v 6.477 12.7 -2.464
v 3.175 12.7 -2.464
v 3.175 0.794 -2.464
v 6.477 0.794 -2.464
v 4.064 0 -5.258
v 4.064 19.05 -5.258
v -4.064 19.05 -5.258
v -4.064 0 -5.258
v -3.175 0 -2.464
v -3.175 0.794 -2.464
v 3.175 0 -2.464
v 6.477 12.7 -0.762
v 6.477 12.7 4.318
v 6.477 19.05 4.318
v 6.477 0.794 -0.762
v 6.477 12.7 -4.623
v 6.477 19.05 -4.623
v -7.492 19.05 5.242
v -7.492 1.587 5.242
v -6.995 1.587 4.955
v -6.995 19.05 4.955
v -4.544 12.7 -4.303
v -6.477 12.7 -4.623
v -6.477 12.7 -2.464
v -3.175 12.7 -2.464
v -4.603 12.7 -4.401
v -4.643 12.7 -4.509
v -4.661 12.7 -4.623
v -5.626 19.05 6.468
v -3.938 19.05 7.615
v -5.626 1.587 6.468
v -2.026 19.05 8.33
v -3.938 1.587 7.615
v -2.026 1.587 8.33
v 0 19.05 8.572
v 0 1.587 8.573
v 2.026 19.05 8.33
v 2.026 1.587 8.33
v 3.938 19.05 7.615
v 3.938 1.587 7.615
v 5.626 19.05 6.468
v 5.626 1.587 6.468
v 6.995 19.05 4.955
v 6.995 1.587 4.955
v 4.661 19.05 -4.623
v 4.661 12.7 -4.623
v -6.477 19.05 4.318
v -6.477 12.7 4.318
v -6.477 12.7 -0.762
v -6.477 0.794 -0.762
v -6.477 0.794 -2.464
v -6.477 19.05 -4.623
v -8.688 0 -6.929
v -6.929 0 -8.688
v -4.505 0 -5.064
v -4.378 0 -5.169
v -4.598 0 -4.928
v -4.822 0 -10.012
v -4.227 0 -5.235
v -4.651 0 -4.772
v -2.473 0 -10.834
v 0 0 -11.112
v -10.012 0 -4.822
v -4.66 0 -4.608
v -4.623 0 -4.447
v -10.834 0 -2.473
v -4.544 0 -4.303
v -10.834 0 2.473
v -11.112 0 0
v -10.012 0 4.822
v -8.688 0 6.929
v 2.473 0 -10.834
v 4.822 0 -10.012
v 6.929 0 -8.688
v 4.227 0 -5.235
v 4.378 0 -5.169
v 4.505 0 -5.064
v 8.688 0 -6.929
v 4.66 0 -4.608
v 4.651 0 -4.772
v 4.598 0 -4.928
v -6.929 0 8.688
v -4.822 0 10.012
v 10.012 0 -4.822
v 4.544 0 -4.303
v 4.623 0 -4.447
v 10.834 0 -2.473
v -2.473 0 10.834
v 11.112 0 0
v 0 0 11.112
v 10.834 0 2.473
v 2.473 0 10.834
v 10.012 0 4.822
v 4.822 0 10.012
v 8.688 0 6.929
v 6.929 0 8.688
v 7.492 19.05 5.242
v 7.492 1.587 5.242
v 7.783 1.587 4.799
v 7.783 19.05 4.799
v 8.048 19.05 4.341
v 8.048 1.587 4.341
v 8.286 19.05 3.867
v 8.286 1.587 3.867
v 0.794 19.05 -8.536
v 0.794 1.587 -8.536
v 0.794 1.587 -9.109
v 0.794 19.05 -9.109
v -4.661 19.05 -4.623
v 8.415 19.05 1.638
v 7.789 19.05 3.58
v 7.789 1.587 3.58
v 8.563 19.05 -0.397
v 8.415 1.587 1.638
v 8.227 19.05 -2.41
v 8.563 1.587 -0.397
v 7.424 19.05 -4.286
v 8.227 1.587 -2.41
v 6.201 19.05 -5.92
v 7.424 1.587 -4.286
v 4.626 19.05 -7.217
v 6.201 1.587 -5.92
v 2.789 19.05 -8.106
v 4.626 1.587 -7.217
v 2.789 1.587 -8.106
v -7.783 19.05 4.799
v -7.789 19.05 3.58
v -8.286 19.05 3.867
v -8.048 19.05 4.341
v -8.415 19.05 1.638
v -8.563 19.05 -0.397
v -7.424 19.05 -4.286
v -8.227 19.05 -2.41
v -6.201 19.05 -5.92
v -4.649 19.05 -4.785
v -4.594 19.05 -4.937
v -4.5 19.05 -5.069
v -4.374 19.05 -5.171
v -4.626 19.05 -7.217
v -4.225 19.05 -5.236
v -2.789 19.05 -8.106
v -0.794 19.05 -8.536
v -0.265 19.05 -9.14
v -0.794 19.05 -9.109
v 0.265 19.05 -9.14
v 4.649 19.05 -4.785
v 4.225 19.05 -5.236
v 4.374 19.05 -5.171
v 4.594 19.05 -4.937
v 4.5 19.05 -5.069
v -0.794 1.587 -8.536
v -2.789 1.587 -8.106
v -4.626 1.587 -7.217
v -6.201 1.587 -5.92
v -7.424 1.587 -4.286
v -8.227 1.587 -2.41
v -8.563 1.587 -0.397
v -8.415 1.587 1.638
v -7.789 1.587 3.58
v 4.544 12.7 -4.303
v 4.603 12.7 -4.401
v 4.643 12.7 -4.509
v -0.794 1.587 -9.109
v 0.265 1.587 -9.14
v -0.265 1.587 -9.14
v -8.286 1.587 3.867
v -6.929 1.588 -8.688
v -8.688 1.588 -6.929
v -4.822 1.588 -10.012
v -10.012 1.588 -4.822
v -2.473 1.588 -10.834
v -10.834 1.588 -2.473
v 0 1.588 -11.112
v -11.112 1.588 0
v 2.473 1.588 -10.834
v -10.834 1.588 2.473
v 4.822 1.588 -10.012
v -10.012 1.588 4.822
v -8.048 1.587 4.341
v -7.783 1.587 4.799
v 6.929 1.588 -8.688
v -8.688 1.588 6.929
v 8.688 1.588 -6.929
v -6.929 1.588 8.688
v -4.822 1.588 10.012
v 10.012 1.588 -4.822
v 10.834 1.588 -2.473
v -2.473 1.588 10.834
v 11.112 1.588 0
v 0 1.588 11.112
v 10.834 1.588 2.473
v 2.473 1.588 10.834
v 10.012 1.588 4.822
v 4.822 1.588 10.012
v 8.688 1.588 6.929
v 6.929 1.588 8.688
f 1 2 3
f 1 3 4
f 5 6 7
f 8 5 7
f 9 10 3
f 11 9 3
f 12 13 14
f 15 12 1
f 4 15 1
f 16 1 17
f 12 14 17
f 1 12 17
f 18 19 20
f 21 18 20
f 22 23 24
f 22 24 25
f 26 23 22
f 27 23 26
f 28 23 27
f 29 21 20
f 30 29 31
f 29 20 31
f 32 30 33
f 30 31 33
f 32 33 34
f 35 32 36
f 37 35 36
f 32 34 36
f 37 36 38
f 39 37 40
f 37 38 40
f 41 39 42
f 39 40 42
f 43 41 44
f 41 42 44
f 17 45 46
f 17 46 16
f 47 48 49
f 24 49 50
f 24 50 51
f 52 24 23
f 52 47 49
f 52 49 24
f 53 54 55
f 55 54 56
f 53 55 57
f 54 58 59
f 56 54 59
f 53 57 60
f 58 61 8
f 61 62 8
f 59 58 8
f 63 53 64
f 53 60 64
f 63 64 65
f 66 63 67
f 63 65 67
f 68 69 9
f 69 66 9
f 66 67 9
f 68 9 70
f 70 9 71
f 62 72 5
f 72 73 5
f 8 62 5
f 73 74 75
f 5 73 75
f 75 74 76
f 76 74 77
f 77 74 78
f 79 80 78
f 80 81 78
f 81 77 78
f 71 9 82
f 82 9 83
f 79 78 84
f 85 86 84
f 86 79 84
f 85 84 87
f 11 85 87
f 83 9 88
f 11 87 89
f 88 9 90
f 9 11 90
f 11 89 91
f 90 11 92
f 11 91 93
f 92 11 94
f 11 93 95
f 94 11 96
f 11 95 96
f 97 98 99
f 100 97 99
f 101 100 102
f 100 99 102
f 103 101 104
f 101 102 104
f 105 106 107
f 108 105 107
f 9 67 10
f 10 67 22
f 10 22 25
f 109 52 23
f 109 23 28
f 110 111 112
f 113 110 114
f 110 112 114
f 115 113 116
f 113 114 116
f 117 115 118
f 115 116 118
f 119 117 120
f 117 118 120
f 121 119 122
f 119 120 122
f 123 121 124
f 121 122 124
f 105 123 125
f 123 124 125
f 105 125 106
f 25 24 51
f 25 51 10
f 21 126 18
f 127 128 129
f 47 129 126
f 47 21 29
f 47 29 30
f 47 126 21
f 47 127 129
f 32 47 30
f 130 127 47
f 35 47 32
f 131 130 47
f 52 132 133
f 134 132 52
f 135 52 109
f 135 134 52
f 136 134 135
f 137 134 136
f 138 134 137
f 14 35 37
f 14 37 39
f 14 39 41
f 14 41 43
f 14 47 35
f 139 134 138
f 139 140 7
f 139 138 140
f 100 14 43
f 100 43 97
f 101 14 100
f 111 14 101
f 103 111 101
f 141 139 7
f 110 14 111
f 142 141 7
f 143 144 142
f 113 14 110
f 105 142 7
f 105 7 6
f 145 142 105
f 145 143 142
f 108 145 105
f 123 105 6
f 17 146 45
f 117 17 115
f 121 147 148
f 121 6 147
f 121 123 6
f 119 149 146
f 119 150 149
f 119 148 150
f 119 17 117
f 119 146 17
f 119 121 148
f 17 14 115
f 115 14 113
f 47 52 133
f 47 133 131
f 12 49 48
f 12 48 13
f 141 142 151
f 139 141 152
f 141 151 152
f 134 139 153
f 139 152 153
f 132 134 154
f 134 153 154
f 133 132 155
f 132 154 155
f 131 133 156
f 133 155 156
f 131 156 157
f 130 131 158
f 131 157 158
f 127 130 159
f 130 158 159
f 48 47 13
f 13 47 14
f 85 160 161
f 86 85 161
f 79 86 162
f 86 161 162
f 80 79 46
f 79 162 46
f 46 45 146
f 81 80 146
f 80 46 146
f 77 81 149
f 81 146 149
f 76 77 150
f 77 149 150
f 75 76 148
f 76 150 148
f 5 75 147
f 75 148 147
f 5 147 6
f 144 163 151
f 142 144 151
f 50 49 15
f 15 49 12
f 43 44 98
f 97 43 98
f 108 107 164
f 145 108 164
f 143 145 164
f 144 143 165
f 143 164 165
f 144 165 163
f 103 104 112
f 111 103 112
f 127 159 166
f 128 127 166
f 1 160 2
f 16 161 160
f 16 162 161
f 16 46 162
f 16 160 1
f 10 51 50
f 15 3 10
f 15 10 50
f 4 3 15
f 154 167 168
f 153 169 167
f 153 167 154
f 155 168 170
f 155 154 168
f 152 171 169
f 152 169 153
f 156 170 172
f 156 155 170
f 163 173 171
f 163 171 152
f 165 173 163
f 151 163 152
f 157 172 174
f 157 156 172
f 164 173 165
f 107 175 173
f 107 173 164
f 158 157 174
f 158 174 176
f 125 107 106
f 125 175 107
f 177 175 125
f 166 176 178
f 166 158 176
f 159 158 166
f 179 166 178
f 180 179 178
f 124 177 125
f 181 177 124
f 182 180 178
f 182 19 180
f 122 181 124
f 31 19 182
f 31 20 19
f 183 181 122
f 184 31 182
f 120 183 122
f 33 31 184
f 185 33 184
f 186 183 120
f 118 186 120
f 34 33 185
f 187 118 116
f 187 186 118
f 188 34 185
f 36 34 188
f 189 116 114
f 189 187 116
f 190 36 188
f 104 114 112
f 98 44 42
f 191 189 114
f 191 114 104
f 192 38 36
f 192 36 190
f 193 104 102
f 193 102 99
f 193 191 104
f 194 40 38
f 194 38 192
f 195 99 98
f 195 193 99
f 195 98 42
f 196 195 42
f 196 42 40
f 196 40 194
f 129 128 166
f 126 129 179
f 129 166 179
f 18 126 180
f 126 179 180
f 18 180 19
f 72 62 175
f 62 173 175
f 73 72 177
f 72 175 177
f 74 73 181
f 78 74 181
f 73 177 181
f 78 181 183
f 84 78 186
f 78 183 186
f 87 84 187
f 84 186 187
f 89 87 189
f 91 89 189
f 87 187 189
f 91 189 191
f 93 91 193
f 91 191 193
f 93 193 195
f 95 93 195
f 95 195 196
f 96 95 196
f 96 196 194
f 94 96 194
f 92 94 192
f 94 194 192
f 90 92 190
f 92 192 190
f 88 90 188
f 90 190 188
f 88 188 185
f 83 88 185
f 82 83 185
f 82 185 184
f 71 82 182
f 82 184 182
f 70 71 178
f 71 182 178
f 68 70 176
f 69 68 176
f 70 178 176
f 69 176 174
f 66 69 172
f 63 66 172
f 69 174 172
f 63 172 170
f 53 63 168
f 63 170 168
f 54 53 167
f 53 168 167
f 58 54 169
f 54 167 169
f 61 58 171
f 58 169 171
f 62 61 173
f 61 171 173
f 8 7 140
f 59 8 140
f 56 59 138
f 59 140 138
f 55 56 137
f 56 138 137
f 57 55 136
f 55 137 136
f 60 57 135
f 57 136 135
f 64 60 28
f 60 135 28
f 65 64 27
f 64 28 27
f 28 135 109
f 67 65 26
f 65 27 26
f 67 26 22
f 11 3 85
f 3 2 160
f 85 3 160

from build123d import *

# Parameters (mm, degrees)
BOSS_EXTRUDE1_DEPTH = 19.05
CUT_EXTRUDE1_DEPTH  = 23.803574111
CUT_EXTRUDE2_DEPTH  = 18.25625
SKETCH6_W           = 0.608326788
SKETCH6_H           = 1.5875
SKETCH8_W           = 2.576826788
SKETCH8_H           = 1.5875
SKETCH9_W           = 12.954
SKETCH9_H           = 5.08
SKETCH9_H_2         = 2.159
CUT_EXTRUDE3_DEPTH  = 6.35


with BuildPart() as part:
    # Sketch1 → Boss-Extrude1 (new body)
    with BuildSketch(Plane(origin=(0, 0, 0), x_dir=(1, 0, 0), z_dir=(0, 1, 0))):
        with BuildLine():
            Line((-0.79375, 9.109483901), (-0.79375, 8.535673212))
            ThreePointArc((-0.79375, 8.535673212), (-7.424002774, 4.28625), (-7.78898484, -3.580428942))
            Line((-7.78898484, -3.580428942), (-8.285919473, -3.867334286))
            ThreePointArc((-8.285919473, -3.867334286), (-7.918936292, -4.572), (-7.492169473, -5.242149615))
            Line((-7.492169473, -5.242149615), (-6.99523484, -4.95524427))
            ThreePointArc((-6.99523484, -4.95524427), (0, -8.5725), (6.99523484, -4.95524427))
            Line((6.99523484, -4.95524427), (7.492169473, -5.242149615))
            ThreePointArc((7.492169473, -5.242149615), (7.918936292, -4.572), (8.285919473, -3.867334286))
            Line((8.285919473, -3.867334286), (7.78898484, -3.580428942))
            ThreePointArc((7.78898484, -3.580428942), (7.424002774, 4.28625), (0.79375, 8.535673212))
            Line((0.79375, 8.535673212), (0.79375, 9.109483901))
            ThreePointArc((0.79375, 9.109483901), (0, 9.144), (-0.79375, 9.109483901))
        make_face()
    extrude(amount=BOSS_EXTRUDE1_DEPTH)

    # Sketch2 → Cut-Extrude1 (cut, through all)
    with BuildSketch(Plane(origin=(0, 19.05, 0), x_dir=(1, 0, 0), z_dir=(0, 1, 0))):
        with BuildLine():
            Line((-4.543615348, 4.303093955), (-3.175, 2.4638))
            Line((-3.175, 2.4638), (3.175, 2.4638))
            Line((3.175, 2.4638), (4.543615348, 4.303093955))
            ThreePointArc((4.543615348, 4.303093955), (4.598203733, 4.928342625), (4.064, 5.2578))
            Line((4.064, 5.2578), (-4.064, 5.2578))
            ThreePointArc((-4.064, 5.2578), (-4.598203733, 4.928342625), (-4.543615348, 4.303093955))
        make_face()
    extrude(amount=-CUT_EXTRUDE1_DEPTH, mode=Mode.SUBTRACT)

    # Sketch2<4> → Cut-Extrude2 (cut)
    with BuildSketch(Plane(origin=(0, 19.05, 0), x_dir=(1, 0, 0), z_dir=(0, 1, 0))):
        Polygon((3.175, 2.4638), (-3.175, 2.4638), (-6.477, 2.4638), (-6.477, 0.762), (6.477, 0.762), (6.477, 2.4638), align=None)
    extrude(amount=-CUT_EXTRUDE2_DEPTH, mode=Mode.SUBTRACT)

    # Sketch6 → Cut-Revolve2 (revolve, cut)
    with BuildSketch(Plane(origin=(0, 0, 0), x_dir=(0, 0, -1), z_dir=(1, 0, 0))):
        with Locations((8.839836606, 0.79375)):
            Rectangle(SKETCH6_W, SKETCH6_H)
    revolve(axis=Axis((0, 19.730213777, 0), (0, -1, 0)), mode=Mode.SUBTRACT)

    # Sketch8 → Revolve2 (revolve)
    with BuildSketch(Plane(origin=(0, 0, 0), x_dir=(0, 0, -1), z_dir=(1, 0, 0))):
        with Locations((9.824086606, 0.79375)):
            Rectangle(SKETCH8_W, SKETCH8_H)
    revolve(axis=Axis((0, 4.48386458, 0), (0, -1, 0)))

    # Sketch9 → Cut-Extrude3 (cut)
    with BuildSketch(Plane(origin=(0, 19.05, 0), x_dir=(1, 0, 0), z_dir=(0, 1, 0))):
        with Locations((0, -1.778)):
            Rectangle(SKETCH9_W, SKETCH9_H)
        with Locations((0, 3.5433)):
            Rectangle(SKETCH9_W, SKETCH9_H_2)
    extrude(amount=-CUT_EXTRUDE3_DEPTH, mode=Mode.SUBTRACT)


solid = part.part
